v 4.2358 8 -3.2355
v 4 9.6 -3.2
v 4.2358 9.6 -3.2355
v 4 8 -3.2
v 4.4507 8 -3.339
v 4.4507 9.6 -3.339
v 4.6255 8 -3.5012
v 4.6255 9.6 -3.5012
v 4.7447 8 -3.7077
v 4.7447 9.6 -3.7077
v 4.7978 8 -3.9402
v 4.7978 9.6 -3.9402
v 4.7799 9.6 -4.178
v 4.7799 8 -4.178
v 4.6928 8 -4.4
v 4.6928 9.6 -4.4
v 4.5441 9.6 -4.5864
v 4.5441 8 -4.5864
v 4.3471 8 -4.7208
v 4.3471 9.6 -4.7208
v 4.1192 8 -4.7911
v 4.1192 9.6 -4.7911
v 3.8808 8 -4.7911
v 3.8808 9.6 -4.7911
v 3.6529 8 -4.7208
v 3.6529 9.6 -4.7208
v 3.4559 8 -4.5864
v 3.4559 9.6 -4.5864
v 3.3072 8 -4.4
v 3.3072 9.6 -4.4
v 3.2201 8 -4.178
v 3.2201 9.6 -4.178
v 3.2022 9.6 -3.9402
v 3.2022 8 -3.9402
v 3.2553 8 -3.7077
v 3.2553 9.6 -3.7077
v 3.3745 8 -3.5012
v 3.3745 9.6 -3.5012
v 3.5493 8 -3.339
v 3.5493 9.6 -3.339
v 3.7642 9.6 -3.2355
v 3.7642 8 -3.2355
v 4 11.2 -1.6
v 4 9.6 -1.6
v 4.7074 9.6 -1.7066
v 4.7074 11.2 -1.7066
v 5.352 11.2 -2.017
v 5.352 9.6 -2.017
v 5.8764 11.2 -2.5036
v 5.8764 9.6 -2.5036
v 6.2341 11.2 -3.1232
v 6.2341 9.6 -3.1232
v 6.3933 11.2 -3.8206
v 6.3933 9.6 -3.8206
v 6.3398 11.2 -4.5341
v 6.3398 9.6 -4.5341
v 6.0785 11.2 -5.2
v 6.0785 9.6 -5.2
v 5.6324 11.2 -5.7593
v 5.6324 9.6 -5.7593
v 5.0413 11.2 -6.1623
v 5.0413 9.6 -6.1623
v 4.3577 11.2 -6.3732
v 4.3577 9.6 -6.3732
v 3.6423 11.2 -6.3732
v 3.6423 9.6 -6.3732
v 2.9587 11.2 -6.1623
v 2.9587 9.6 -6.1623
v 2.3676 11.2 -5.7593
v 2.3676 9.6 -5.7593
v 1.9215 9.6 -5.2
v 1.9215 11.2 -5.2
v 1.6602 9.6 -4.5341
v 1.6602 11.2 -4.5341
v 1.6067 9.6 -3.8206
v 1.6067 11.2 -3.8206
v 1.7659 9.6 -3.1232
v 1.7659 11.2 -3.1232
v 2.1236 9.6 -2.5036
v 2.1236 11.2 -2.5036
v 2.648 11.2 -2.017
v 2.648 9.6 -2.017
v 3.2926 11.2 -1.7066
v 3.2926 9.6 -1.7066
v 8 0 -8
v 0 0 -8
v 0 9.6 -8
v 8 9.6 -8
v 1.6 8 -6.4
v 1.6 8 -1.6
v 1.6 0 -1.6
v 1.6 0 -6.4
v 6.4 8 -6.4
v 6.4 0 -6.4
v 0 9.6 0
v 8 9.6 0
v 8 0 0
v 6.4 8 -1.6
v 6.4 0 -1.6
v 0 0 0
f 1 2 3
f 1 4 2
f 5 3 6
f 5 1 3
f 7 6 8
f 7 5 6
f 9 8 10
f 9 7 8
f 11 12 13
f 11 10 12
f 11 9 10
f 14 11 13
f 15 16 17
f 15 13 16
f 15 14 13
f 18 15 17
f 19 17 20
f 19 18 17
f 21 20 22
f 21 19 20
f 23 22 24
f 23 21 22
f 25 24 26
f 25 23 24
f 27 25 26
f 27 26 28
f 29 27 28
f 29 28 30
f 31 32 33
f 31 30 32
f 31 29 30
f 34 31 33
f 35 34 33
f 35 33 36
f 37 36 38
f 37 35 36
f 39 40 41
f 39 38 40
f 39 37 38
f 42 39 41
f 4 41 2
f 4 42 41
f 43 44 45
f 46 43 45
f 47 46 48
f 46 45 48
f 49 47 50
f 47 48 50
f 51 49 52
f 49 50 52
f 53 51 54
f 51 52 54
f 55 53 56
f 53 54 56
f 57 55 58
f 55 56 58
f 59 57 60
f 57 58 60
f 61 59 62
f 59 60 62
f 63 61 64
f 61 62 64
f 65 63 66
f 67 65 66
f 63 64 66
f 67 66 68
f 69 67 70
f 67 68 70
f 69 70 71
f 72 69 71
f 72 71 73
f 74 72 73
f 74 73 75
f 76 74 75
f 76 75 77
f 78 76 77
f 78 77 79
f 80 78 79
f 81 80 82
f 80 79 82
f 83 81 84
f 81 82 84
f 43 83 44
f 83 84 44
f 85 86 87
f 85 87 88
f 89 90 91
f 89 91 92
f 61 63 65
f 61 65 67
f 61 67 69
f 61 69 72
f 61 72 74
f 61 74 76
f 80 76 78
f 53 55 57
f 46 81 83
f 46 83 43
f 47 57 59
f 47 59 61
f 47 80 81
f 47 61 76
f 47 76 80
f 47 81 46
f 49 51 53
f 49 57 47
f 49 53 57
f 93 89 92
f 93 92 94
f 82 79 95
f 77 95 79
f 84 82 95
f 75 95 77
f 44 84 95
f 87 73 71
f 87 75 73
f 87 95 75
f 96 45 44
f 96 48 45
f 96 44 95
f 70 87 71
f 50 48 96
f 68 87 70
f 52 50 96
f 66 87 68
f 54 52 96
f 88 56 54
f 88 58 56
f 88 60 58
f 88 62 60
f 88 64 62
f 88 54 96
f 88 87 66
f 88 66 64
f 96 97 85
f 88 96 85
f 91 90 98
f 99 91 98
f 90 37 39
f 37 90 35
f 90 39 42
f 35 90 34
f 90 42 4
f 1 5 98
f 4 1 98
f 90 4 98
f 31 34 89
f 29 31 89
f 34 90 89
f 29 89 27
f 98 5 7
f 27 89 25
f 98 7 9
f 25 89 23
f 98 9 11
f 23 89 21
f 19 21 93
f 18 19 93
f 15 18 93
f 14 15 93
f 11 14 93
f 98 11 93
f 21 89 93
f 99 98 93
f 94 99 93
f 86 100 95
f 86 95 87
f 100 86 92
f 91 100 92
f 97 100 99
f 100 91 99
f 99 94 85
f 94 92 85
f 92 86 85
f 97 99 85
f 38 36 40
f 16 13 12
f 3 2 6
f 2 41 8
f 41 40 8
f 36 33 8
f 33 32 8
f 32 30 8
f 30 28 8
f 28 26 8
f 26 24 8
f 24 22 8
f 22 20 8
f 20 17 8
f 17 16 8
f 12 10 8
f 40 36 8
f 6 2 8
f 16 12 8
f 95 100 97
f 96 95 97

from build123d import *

# Parameters (mm, degrees)
SKETCH1_W           = 8
SKETCH1_H           = 8
BOSS_EXTRUDE1_DEPTH = 9.6
SKETCH2_R           = 2.4
BOSS_EXTRUDE2_DEPTH = 1.6
SHELL1_T            = -1.6


with BuildPart() as part:
    # Sketch1 → Boss-Extrude1 (new body)
    with BuildSketch(Plane(origin=(0, 0, 0), x_dir=(1, 0, 0), z_dir=(0, 1, 0))):
        with Locations((4, 4)):
            Rectangle(SKETCH1_W, SKETCH1_H)
    extrude(amount=BOSS_EXTRUDE1_DEPTH)

    # Sketch2 → Boss-Extrude2 (add)
    with BuildSketch(Plane(origin=(0, 9.6, 0), x_dir=(1, 0, 0), z_dir=(0, 1, 0))):
        with Locations(Location((4, 4, 0), (0, 0, 270))):
            Circle(SKETCH2_R)
    extrude(amount=BOSS_EXTRUDE2_DEPTH)

    # Shell1
    shell1_openings = [part.faces().sort_by_distance(p)[0] for p in [
        (4, 0, -4),
    ]]
    offset(amount=SHELL1_T, openings=shell1_openings, kind=Kind.INTERSECTION)


solid = part.part
